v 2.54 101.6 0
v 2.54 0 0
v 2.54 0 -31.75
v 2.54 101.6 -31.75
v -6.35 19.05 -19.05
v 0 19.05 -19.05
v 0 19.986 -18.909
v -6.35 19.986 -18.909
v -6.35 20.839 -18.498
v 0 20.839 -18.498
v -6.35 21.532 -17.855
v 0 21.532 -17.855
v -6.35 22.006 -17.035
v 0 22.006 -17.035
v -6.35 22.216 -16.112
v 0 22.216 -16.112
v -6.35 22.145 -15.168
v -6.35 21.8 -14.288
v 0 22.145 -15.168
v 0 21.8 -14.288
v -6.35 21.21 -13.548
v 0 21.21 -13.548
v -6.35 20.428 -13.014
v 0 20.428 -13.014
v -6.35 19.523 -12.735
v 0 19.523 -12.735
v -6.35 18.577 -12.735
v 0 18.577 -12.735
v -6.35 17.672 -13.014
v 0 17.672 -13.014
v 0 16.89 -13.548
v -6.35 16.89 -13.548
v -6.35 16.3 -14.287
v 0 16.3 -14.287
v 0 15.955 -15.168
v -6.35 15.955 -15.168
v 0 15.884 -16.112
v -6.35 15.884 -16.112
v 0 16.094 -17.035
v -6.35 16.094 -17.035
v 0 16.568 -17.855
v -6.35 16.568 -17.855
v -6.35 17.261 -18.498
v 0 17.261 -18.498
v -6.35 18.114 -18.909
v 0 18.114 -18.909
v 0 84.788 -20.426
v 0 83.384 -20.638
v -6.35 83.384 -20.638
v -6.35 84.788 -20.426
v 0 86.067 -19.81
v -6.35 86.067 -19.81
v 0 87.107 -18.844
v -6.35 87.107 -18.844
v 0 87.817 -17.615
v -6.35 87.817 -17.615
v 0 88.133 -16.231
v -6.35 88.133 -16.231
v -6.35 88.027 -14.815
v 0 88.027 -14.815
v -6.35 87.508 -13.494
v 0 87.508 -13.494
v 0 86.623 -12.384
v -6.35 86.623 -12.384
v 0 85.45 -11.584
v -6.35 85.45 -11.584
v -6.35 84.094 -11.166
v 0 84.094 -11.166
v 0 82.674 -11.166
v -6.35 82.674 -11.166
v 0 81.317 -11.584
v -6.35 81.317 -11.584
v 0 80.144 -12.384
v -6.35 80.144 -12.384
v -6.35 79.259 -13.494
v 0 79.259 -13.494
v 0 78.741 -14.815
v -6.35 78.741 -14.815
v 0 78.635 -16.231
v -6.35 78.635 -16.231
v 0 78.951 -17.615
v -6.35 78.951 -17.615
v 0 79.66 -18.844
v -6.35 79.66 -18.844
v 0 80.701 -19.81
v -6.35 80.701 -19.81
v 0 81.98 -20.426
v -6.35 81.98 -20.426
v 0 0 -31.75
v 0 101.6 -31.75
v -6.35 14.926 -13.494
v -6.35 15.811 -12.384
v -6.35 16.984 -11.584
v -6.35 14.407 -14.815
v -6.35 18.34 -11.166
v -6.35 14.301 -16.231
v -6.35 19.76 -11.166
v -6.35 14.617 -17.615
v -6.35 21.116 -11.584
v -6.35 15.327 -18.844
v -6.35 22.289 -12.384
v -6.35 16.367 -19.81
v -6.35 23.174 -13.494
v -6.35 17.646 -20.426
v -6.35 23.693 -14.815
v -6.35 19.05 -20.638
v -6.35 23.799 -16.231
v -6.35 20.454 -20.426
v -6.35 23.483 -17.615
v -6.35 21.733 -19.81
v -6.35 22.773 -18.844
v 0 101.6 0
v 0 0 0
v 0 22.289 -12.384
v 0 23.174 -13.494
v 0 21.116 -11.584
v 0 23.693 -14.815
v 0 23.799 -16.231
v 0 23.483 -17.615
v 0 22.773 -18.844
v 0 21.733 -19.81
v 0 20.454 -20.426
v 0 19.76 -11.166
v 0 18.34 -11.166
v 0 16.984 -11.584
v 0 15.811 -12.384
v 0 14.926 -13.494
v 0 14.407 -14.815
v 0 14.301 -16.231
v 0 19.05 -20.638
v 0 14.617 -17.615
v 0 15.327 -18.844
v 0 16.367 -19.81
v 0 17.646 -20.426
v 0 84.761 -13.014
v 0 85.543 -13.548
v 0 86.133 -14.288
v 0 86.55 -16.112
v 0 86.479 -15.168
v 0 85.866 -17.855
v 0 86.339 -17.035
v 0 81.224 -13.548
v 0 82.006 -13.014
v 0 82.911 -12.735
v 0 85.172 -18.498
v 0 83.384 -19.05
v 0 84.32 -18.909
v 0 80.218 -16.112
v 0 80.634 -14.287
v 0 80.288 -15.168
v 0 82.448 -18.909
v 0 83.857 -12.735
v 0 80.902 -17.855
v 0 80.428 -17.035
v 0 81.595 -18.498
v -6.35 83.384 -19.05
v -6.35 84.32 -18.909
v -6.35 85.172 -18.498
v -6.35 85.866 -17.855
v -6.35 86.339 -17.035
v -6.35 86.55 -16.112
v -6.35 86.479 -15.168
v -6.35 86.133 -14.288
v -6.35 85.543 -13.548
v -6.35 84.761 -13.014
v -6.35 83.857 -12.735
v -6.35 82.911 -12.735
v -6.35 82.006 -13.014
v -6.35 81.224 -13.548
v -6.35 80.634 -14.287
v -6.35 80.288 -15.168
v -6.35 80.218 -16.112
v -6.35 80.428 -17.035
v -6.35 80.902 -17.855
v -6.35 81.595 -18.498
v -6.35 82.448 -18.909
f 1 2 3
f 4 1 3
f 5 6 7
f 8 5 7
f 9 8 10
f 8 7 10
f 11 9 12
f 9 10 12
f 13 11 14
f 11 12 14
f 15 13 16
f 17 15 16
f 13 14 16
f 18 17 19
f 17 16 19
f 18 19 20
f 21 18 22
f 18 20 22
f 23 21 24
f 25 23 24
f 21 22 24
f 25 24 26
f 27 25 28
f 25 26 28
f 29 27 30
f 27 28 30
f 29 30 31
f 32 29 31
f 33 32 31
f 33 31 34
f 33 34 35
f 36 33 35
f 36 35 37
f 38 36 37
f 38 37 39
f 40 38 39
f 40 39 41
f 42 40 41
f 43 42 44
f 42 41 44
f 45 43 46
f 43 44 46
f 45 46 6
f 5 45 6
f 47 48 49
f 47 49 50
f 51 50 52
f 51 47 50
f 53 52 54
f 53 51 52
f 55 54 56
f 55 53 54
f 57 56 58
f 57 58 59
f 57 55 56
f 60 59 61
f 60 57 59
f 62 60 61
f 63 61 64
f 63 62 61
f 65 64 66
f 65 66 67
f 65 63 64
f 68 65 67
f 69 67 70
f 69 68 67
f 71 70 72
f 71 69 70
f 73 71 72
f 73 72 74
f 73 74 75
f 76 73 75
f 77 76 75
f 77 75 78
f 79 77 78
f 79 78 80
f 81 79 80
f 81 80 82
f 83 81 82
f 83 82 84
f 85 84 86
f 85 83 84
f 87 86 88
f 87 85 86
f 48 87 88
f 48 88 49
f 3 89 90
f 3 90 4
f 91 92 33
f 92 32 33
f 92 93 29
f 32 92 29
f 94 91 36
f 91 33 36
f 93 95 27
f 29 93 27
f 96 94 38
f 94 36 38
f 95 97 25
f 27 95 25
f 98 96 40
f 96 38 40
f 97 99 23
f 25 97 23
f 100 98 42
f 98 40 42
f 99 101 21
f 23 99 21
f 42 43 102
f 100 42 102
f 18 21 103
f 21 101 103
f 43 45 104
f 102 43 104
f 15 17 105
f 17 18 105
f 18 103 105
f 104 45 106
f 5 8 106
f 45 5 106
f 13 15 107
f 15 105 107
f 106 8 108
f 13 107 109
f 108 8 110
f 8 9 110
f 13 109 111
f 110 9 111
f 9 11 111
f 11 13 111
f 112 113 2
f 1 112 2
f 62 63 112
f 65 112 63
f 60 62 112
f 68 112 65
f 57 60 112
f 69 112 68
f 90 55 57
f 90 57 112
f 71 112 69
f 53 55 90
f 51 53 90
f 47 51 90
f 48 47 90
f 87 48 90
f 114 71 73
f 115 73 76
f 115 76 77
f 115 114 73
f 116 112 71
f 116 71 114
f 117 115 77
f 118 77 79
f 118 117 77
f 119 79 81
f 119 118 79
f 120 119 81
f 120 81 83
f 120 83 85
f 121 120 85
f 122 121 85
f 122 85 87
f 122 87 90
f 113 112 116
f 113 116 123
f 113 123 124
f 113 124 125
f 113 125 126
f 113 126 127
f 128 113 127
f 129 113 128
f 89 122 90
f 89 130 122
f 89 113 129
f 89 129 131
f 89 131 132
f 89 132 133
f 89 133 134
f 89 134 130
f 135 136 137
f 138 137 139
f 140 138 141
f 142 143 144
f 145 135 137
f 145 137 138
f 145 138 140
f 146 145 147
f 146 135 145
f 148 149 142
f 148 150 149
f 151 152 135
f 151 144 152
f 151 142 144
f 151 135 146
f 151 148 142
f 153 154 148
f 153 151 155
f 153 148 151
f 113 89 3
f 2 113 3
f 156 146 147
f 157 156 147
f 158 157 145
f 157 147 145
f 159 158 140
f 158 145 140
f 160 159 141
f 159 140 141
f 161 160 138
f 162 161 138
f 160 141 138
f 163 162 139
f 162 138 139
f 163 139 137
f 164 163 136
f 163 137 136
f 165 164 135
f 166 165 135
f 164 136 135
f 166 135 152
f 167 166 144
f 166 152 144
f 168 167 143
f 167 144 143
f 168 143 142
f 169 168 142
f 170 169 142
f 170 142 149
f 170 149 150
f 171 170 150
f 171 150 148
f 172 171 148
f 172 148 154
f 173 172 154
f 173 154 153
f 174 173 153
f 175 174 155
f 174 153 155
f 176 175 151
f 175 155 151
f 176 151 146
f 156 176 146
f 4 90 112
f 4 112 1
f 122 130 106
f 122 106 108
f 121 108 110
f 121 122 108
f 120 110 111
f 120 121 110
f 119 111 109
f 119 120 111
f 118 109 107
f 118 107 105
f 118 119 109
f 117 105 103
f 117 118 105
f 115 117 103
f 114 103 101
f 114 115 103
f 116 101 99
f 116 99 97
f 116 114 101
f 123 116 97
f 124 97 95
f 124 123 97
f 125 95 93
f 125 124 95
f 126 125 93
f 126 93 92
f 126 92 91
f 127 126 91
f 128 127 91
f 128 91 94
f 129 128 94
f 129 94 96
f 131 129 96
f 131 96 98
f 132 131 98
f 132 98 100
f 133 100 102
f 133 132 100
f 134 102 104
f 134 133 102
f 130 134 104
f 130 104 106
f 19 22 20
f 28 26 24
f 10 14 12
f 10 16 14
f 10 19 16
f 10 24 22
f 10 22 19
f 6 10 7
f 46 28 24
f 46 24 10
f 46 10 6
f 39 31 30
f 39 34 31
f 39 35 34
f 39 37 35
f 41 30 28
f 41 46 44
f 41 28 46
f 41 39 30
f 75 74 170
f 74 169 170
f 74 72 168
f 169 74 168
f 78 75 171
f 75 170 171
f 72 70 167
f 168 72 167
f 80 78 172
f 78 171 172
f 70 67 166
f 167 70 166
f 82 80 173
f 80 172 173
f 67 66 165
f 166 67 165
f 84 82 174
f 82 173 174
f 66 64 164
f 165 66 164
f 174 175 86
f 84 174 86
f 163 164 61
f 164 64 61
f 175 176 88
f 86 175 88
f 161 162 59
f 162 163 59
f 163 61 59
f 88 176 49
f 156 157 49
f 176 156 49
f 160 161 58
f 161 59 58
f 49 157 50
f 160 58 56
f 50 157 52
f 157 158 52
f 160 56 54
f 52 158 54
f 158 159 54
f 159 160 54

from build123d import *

# Parameters (mm, degrees)
SKETCH1_W           = 2.54
SKETCH1_H           = 31.75
BOSS_EXTRUDE1_DEPTH = 101.6
SKETCH5_R           = 4.7625
SKETCH5_R_2         = 3.175
BOSS_EXTRUDE3_DEPTH = 6.35


with BuildPart() as part:
    # Sketch1 → Boss-Extrude1 (new body)
    with BuildSketch(Plane(origin=(0, 0, 0), x_dir=(1, 0, 0), z_dir=(0, 1, 0))):
        with Locations((1.27, 15.875)):
            Rectangle(SKETCH1_W, SKETCH1_H)
    extrude(amount=BOSS_EXTRUDE1_DEPTH)

    # Sketch5 → Boss-Extrude3 (add)
    with BuildSketch(Plane(origin=(0, 0, 0), x_dir=(0, 0, -1), z_dir=(1, 0, 0))):
        with Locations((15.875, 19.05)):
            Circle(SKETCH5_R)
        with Locations((15.875, 19.05)):
            Circle(SKETCH5_R_2, mode=Mode.SUBTRACT)
        with Locations((15.875, 83.383819167)):
            Circle(SKETCH5_R)
        with Locations((15.875, 83.383819167)):
            Circle(SKETCH5_R_2, mode=Mode.SUBTRACT)
    extrude(amount=-BOSS_EXTRUDE3_DEPTH)


solid = part.part
